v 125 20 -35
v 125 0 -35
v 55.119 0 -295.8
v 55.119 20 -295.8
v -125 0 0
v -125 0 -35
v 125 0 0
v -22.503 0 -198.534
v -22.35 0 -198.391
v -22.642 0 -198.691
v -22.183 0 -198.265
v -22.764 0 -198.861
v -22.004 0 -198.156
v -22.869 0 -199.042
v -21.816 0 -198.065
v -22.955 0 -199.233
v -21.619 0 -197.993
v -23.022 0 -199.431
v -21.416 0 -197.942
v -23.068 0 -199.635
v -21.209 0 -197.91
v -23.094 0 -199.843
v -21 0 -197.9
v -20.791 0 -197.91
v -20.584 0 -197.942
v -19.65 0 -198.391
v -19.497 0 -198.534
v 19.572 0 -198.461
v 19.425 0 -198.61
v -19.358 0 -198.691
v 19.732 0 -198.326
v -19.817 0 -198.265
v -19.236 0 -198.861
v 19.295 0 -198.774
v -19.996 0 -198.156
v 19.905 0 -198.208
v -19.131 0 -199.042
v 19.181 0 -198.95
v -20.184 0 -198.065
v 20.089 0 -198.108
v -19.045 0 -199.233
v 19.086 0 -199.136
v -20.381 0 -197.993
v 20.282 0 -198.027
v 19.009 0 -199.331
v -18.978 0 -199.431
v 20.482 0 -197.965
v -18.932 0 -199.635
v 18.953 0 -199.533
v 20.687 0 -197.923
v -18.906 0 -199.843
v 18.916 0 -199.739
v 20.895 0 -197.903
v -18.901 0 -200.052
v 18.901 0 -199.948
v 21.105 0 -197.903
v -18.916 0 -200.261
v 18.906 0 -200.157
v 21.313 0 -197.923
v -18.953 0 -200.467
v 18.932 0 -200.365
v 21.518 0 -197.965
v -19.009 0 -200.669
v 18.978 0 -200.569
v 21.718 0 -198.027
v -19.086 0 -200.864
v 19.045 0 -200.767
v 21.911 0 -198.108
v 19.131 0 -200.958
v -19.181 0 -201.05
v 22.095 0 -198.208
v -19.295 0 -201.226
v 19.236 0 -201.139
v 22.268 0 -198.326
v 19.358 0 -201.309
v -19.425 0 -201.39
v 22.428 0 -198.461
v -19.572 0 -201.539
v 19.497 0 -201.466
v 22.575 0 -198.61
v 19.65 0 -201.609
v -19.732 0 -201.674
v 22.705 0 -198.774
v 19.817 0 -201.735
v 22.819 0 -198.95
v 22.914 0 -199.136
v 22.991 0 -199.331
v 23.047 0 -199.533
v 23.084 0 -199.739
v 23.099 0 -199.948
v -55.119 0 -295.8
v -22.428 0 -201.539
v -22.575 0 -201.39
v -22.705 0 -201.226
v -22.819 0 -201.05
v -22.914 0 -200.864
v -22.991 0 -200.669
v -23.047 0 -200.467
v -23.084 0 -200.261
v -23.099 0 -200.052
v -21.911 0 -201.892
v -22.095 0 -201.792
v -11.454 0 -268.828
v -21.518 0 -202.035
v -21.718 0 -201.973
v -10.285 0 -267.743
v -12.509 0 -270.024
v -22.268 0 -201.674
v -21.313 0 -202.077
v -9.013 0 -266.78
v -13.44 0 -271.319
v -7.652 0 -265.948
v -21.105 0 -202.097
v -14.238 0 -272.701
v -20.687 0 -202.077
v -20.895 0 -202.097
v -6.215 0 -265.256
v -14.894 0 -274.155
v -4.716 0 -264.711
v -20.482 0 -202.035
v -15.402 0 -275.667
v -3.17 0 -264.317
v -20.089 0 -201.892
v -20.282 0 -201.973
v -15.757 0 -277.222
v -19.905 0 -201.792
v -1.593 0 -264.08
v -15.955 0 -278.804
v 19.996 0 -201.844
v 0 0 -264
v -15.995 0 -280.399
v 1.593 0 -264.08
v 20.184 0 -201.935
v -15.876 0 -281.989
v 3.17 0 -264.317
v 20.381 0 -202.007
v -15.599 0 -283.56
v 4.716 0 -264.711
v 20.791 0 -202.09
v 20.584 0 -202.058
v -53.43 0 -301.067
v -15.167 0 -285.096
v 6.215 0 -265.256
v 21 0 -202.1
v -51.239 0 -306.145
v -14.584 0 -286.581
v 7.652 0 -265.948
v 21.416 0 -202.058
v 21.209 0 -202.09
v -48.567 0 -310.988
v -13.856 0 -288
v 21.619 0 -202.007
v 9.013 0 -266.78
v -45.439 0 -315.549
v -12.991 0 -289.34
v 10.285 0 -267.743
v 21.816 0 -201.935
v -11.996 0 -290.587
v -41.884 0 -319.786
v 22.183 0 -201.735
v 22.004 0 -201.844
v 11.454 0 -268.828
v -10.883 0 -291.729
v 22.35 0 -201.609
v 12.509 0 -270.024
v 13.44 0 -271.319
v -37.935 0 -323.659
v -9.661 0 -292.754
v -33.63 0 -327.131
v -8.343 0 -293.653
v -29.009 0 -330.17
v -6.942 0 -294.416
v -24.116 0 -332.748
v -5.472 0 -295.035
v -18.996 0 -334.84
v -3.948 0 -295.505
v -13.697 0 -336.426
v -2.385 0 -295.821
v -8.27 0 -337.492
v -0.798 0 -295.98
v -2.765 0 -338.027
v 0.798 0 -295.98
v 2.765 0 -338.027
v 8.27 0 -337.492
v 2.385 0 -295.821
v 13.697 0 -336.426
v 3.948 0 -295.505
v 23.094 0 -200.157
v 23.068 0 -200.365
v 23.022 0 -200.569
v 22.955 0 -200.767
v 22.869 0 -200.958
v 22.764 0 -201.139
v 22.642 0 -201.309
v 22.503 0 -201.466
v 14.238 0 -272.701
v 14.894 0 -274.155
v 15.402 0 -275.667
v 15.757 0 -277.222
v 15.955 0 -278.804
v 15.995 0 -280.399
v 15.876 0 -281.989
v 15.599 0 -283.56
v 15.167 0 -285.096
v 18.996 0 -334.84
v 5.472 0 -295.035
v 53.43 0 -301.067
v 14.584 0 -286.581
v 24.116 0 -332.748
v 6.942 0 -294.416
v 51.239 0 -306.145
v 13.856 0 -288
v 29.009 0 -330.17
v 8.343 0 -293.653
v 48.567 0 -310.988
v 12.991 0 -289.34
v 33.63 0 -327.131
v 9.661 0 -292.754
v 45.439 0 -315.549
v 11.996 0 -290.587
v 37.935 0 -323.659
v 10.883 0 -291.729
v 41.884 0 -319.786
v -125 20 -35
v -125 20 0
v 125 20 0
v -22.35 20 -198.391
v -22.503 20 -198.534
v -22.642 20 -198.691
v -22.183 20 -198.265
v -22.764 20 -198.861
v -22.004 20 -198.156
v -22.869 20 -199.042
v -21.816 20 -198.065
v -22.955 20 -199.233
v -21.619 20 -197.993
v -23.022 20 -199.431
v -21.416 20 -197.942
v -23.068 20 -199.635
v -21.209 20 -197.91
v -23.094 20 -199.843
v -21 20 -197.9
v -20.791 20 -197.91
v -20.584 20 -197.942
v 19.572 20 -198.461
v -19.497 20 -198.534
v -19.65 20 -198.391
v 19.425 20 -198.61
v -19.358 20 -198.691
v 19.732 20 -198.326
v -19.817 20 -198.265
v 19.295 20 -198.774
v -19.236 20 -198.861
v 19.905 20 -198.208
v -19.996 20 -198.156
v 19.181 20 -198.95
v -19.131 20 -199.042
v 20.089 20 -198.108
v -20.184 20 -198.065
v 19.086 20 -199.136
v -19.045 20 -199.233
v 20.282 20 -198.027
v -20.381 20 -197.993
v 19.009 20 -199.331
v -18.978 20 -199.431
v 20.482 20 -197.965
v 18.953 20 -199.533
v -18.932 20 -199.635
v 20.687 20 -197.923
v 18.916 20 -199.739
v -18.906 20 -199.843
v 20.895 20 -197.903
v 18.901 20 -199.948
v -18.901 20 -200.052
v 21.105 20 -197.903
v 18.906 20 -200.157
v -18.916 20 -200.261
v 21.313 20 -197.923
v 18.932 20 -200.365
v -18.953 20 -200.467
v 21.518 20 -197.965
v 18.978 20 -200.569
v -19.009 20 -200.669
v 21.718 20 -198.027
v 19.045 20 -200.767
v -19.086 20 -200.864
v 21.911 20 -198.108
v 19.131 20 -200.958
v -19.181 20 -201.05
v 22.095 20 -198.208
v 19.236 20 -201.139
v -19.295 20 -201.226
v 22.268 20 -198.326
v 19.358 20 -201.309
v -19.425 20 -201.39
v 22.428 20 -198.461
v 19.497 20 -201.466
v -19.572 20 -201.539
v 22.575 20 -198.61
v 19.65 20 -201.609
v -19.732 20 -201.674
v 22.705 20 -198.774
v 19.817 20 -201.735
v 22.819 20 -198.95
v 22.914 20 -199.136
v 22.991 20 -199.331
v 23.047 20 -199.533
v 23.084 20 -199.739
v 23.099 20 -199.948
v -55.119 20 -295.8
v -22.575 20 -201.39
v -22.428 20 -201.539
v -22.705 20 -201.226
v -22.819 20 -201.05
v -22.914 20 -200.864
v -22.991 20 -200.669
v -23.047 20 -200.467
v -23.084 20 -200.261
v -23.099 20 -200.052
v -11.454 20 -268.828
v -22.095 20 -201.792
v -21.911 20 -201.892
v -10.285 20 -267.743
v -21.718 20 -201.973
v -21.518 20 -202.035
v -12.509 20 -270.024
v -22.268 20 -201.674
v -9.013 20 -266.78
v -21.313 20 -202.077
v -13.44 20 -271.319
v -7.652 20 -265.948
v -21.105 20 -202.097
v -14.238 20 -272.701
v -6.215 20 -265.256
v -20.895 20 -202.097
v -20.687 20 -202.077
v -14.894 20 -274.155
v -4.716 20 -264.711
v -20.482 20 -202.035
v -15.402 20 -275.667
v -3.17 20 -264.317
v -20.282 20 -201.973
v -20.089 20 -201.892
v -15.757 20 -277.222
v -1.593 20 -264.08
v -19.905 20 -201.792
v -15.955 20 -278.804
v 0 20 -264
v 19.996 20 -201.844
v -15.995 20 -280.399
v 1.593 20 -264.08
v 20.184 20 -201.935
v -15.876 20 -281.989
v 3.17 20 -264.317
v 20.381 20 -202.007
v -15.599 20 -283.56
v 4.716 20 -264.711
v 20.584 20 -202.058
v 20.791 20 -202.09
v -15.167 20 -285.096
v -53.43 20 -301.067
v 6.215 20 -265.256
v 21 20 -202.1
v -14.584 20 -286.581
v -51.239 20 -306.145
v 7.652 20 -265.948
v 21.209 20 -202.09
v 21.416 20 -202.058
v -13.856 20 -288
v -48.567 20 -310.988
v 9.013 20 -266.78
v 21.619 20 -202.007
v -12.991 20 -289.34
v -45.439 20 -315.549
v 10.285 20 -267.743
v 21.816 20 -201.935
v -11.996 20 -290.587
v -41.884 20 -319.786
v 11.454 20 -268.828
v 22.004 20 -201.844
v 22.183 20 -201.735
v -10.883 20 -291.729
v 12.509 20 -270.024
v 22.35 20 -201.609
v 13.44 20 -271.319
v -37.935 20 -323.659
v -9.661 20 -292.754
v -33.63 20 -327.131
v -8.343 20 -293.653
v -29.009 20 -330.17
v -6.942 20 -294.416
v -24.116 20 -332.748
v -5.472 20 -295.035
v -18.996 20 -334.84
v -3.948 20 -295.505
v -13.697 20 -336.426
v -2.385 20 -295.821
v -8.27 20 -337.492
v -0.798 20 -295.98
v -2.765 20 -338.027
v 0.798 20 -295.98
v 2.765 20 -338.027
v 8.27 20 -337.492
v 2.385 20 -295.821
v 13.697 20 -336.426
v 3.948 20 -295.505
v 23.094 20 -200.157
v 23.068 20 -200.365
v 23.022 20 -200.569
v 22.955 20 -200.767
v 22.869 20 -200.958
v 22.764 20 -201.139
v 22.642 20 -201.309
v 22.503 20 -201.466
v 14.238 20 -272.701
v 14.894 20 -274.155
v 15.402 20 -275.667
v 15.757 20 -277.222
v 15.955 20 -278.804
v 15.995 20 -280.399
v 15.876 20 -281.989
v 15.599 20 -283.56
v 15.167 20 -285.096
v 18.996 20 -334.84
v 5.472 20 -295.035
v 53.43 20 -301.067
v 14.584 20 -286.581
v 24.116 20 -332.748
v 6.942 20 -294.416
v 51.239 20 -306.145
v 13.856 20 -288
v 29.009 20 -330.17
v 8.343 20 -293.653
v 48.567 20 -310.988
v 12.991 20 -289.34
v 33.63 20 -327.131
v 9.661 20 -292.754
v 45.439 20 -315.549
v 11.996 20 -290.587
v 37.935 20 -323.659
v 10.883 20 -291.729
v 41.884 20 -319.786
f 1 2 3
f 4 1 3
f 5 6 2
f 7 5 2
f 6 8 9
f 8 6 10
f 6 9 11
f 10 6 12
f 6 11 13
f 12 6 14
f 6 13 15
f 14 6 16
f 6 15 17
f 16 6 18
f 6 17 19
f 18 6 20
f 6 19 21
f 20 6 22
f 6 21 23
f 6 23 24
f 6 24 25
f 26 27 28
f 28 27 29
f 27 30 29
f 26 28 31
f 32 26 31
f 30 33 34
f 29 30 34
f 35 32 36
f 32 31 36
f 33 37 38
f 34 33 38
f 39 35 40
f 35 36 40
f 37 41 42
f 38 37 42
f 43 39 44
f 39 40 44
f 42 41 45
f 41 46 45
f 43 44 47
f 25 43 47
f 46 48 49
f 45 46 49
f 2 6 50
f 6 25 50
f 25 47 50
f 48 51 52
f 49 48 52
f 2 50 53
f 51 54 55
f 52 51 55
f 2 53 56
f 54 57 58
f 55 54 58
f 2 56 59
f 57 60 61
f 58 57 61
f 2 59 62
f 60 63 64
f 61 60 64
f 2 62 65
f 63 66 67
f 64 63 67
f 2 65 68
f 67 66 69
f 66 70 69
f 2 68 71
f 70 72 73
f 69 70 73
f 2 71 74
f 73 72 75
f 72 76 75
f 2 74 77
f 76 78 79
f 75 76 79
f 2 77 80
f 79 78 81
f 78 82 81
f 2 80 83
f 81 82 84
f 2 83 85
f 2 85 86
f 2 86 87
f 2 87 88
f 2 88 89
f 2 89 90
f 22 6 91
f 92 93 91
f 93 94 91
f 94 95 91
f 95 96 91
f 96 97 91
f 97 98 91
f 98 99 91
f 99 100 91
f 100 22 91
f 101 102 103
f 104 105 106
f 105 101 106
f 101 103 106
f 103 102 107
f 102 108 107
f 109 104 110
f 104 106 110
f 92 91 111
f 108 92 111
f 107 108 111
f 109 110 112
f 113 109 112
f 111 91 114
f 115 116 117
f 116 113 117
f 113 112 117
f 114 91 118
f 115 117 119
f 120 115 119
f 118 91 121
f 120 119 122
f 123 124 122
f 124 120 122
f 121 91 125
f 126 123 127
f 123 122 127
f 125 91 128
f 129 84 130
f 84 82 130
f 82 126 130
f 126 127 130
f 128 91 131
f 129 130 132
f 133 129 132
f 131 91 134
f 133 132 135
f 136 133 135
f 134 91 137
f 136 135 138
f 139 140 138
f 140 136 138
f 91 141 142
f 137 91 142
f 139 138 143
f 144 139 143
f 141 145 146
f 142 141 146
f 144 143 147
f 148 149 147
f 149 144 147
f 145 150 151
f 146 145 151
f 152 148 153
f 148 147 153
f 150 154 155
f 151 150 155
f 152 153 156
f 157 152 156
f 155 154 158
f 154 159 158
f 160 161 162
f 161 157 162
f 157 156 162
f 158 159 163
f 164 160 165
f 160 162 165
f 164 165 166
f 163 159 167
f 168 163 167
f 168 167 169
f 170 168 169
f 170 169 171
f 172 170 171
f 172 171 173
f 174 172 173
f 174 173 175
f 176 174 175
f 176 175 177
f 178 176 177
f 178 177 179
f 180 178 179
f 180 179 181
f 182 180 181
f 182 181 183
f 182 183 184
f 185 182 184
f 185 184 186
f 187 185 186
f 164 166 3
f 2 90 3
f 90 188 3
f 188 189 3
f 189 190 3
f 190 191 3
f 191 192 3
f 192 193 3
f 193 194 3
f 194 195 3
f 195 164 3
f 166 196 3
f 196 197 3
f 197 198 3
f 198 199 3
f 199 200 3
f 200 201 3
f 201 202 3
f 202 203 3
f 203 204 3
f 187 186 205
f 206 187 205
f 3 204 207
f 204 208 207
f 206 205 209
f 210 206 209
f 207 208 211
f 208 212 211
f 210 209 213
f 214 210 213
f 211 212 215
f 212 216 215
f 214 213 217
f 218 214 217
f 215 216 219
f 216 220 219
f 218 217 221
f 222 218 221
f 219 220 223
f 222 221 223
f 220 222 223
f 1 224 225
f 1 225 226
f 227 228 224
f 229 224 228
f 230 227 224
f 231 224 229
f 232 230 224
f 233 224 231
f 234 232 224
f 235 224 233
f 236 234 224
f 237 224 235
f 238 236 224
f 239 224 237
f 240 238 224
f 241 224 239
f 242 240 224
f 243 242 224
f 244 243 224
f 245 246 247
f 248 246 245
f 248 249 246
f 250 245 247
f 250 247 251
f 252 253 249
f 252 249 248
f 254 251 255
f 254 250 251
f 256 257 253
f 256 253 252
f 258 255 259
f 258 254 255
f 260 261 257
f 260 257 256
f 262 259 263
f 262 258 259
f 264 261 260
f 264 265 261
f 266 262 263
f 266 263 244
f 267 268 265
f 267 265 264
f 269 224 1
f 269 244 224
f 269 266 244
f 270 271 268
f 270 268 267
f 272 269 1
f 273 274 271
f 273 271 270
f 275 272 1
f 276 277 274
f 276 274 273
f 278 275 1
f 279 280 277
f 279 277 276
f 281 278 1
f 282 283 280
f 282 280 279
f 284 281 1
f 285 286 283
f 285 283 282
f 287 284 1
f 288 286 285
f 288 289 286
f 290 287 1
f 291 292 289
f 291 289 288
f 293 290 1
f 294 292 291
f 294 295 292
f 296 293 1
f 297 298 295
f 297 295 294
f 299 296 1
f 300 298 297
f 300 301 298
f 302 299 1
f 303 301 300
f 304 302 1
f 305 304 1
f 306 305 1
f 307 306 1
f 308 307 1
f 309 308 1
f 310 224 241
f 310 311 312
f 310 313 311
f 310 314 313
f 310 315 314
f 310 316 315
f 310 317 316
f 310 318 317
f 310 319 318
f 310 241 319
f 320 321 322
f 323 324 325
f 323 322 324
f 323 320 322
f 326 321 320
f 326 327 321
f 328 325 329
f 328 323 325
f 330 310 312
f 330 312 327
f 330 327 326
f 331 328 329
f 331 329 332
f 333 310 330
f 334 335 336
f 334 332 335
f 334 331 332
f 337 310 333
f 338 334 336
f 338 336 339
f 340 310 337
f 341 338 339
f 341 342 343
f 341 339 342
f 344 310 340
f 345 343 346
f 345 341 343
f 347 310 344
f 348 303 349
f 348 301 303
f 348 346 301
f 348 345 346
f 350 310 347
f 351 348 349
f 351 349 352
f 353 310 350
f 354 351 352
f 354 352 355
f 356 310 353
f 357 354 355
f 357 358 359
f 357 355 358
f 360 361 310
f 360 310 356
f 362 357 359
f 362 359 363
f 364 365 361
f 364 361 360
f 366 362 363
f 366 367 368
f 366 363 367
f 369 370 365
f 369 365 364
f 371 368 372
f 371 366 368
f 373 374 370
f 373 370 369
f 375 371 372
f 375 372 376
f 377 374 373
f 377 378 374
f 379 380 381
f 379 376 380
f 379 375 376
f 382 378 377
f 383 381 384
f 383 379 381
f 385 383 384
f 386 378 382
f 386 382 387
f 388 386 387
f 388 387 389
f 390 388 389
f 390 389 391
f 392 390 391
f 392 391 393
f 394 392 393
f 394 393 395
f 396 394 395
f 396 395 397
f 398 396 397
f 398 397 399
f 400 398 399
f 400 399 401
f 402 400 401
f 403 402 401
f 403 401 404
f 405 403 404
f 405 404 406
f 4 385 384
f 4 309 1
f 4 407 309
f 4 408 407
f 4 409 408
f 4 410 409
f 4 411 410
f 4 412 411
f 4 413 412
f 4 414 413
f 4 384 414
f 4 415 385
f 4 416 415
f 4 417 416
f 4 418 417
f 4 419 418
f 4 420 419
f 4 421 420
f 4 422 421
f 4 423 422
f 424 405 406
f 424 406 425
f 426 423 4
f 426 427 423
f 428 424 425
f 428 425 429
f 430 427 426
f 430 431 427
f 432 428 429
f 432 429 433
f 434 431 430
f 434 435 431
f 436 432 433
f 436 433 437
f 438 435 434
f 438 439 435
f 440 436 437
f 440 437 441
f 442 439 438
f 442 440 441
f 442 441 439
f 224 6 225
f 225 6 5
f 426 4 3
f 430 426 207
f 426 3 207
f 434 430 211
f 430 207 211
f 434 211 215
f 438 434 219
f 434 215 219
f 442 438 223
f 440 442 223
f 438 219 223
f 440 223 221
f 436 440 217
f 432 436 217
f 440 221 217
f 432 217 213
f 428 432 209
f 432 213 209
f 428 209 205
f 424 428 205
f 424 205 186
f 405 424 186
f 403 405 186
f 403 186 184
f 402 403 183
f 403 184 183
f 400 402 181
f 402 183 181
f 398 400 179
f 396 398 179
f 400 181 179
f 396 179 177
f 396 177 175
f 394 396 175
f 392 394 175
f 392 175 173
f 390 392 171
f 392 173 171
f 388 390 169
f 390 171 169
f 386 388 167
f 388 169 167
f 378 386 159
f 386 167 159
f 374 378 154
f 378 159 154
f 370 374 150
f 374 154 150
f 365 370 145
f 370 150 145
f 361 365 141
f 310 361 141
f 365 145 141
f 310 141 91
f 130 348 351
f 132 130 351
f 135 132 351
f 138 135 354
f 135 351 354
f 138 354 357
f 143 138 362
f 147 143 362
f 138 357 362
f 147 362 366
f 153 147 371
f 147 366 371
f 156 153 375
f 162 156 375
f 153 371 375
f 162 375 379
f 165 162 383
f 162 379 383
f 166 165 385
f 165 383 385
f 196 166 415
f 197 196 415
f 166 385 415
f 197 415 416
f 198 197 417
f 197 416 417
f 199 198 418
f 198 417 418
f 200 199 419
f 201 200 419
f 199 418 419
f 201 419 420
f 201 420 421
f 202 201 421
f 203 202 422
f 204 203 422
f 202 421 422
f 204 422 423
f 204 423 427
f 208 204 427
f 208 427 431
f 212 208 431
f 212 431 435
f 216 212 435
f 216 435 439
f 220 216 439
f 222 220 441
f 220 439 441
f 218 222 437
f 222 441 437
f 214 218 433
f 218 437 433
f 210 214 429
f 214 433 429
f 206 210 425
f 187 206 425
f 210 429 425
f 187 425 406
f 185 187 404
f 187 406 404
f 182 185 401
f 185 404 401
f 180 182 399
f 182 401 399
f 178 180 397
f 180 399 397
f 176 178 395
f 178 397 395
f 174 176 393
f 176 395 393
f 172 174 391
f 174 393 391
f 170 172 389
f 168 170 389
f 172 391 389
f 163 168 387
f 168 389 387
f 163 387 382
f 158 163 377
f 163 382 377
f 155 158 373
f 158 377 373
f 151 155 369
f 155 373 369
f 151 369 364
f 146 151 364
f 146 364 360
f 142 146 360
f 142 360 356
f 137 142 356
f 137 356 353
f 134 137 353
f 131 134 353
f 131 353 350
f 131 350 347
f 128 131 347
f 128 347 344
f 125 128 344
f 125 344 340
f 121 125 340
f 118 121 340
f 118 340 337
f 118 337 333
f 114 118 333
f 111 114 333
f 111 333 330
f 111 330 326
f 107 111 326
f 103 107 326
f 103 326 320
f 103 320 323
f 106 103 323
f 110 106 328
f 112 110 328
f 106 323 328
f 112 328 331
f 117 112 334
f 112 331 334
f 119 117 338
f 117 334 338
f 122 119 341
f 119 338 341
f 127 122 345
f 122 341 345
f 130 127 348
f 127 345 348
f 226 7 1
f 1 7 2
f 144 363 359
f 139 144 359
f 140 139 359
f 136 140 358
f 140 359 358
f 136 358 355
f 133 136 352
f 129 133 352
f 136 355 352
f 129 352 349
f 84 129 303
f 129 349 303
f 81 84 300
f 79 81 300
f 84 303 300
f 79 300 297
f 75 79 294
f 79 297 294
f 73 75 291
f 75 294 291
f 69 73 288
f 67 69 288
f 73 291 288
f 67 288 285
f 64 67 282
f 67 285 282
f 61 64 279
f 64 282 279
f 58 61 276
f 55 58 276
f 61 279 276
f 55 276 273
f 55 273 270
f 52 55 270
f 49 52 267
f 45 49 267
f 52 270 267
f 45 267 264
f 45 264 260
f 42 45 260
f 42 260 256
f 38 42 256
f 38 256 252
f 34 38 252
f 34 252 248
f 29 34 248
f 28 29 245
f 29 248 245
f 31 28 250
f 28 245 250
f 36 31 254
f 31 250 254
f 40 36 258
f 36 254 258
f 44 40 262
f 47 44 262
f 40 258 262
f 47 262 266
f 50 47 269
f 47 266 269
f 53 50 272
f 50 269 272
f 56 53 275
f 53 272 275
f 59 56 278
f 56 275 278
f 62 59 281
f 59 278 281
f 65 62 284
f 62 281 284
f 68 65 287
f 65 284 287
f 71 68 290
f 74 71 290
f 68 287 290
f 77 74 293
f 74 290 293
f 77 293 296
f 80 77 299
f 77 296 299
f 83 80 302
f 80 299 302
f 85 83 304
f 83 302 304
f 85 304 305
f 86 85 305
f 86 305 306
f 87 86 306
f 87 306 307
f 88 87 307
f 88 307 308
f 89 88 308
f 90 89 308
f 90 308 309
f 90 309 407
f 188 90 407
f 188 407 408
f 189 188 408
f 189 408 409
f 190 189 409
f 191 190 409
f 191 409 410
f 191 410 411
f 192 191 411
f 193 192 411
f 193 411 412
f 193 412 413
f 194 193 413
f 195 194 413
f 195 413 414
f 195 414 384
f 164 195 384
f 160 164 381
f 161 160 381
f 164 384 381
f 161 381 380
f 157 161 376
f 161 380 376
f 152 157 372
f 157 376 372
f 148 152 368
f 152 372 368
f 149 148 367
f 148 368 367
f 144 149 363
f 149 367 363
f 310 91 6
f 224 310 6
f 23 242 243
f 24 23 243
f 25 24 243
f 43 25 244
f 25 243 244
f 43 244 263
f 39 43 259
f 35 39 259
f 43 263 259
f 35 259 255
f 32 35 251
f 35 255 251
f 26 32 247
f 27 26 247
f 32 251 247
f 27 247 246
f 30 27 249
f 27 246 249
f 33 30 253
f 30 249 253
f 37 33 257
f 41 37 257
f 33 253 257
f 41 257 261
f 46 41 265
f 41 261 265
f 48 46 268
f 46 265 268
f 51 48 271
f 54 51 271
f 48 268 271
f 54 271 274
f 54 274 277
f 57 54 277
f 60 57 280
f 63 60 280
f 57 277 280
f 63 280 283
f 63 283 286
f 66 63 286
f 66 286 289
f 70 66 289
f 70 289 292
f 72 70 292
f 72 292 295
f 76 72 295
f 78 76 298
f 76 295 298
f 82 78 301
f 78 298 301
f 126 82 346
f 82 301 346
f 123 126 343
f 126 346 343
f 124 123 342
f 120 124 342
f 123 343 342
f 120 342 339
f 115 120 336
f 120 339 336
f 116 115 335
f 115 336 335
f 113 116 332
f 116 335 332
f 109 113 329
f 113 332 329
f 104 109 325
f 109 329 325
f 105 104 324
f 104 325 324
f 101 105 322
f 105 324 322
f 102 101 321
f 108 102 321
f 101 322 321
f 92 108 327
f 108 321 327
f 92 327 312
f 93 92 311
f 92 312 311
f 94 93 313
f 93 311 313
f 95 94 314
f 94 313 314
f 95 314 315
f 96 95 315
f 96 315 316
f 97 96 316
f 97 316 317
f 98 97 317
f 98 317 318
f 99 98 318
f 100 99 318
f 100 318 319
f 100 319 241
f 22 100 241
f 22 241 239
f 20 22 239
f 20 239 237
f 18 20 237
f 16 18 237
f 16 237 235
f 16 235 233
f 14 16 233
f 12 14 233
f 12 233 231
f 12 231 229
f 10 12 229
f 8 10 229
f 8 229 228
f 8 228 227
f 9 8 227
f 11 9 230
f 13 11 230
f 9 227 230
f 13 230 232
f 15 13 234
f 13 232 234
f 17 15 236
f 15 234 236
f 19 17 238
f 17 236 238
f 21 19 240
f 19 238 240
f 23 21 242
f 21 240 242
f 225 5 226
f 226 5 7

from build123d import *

# Parameters (mm, degrees)
BOSS_EXTRUDE1_DEPTH = 20
SKETCH3_R           = 2.1
SKETCH3_R_2         = 16
CUT_EXTRUDE2_DEPTH  = 20


with BuildPart() as part:
    # Sketch1 → Boss-Extrude1 (new body)
    with BuildSketch(Plane(origin=(0, 0, 0), x_dir=(1, 0, 0), z_dir=(0, 1, 0))):
        with BuildLine():
            Line((-55.118857822, 295.799973098), (-125, 35))
            Line((-125, 35), (-125, 0))
            Line((-125, 0), (125, 0))
            Line((125, 0), (125, 35))
            Line((125, 35), (55.118857822, 295.799973098))
            ThreePointArc((55.118857822, 295.799973098), (0, 338.094160252), (-55.118857822, 295.799973098))
        make_face()
    extrude(amount=BOSS_EXTRUDE1_DEPTH)

    # Sketch3 → Cut-Extrude2 (cut)
    with BuildSketch(Plane(origin=(0, 20, 0), x_dir=(1, 0, 0), z_dir=(0, 1, 0))):
        with Locations(Location((-21, 200, 0), (0, 0, 270))):
            Circle(SKETCH3_R)
        with Locations(Location((21, 200, 0), (0, 0, 90))):
            Circle(SKETCH3_R)
        with Locations(Location((0, 280, 0), (0, 0, 270))):
            Circle(SKETCH3_R_2)
    extrude(amount=-CUT_EXTRUDE2_DEPTH, mode=Mode.SUBTRACT)


solid = part.part
